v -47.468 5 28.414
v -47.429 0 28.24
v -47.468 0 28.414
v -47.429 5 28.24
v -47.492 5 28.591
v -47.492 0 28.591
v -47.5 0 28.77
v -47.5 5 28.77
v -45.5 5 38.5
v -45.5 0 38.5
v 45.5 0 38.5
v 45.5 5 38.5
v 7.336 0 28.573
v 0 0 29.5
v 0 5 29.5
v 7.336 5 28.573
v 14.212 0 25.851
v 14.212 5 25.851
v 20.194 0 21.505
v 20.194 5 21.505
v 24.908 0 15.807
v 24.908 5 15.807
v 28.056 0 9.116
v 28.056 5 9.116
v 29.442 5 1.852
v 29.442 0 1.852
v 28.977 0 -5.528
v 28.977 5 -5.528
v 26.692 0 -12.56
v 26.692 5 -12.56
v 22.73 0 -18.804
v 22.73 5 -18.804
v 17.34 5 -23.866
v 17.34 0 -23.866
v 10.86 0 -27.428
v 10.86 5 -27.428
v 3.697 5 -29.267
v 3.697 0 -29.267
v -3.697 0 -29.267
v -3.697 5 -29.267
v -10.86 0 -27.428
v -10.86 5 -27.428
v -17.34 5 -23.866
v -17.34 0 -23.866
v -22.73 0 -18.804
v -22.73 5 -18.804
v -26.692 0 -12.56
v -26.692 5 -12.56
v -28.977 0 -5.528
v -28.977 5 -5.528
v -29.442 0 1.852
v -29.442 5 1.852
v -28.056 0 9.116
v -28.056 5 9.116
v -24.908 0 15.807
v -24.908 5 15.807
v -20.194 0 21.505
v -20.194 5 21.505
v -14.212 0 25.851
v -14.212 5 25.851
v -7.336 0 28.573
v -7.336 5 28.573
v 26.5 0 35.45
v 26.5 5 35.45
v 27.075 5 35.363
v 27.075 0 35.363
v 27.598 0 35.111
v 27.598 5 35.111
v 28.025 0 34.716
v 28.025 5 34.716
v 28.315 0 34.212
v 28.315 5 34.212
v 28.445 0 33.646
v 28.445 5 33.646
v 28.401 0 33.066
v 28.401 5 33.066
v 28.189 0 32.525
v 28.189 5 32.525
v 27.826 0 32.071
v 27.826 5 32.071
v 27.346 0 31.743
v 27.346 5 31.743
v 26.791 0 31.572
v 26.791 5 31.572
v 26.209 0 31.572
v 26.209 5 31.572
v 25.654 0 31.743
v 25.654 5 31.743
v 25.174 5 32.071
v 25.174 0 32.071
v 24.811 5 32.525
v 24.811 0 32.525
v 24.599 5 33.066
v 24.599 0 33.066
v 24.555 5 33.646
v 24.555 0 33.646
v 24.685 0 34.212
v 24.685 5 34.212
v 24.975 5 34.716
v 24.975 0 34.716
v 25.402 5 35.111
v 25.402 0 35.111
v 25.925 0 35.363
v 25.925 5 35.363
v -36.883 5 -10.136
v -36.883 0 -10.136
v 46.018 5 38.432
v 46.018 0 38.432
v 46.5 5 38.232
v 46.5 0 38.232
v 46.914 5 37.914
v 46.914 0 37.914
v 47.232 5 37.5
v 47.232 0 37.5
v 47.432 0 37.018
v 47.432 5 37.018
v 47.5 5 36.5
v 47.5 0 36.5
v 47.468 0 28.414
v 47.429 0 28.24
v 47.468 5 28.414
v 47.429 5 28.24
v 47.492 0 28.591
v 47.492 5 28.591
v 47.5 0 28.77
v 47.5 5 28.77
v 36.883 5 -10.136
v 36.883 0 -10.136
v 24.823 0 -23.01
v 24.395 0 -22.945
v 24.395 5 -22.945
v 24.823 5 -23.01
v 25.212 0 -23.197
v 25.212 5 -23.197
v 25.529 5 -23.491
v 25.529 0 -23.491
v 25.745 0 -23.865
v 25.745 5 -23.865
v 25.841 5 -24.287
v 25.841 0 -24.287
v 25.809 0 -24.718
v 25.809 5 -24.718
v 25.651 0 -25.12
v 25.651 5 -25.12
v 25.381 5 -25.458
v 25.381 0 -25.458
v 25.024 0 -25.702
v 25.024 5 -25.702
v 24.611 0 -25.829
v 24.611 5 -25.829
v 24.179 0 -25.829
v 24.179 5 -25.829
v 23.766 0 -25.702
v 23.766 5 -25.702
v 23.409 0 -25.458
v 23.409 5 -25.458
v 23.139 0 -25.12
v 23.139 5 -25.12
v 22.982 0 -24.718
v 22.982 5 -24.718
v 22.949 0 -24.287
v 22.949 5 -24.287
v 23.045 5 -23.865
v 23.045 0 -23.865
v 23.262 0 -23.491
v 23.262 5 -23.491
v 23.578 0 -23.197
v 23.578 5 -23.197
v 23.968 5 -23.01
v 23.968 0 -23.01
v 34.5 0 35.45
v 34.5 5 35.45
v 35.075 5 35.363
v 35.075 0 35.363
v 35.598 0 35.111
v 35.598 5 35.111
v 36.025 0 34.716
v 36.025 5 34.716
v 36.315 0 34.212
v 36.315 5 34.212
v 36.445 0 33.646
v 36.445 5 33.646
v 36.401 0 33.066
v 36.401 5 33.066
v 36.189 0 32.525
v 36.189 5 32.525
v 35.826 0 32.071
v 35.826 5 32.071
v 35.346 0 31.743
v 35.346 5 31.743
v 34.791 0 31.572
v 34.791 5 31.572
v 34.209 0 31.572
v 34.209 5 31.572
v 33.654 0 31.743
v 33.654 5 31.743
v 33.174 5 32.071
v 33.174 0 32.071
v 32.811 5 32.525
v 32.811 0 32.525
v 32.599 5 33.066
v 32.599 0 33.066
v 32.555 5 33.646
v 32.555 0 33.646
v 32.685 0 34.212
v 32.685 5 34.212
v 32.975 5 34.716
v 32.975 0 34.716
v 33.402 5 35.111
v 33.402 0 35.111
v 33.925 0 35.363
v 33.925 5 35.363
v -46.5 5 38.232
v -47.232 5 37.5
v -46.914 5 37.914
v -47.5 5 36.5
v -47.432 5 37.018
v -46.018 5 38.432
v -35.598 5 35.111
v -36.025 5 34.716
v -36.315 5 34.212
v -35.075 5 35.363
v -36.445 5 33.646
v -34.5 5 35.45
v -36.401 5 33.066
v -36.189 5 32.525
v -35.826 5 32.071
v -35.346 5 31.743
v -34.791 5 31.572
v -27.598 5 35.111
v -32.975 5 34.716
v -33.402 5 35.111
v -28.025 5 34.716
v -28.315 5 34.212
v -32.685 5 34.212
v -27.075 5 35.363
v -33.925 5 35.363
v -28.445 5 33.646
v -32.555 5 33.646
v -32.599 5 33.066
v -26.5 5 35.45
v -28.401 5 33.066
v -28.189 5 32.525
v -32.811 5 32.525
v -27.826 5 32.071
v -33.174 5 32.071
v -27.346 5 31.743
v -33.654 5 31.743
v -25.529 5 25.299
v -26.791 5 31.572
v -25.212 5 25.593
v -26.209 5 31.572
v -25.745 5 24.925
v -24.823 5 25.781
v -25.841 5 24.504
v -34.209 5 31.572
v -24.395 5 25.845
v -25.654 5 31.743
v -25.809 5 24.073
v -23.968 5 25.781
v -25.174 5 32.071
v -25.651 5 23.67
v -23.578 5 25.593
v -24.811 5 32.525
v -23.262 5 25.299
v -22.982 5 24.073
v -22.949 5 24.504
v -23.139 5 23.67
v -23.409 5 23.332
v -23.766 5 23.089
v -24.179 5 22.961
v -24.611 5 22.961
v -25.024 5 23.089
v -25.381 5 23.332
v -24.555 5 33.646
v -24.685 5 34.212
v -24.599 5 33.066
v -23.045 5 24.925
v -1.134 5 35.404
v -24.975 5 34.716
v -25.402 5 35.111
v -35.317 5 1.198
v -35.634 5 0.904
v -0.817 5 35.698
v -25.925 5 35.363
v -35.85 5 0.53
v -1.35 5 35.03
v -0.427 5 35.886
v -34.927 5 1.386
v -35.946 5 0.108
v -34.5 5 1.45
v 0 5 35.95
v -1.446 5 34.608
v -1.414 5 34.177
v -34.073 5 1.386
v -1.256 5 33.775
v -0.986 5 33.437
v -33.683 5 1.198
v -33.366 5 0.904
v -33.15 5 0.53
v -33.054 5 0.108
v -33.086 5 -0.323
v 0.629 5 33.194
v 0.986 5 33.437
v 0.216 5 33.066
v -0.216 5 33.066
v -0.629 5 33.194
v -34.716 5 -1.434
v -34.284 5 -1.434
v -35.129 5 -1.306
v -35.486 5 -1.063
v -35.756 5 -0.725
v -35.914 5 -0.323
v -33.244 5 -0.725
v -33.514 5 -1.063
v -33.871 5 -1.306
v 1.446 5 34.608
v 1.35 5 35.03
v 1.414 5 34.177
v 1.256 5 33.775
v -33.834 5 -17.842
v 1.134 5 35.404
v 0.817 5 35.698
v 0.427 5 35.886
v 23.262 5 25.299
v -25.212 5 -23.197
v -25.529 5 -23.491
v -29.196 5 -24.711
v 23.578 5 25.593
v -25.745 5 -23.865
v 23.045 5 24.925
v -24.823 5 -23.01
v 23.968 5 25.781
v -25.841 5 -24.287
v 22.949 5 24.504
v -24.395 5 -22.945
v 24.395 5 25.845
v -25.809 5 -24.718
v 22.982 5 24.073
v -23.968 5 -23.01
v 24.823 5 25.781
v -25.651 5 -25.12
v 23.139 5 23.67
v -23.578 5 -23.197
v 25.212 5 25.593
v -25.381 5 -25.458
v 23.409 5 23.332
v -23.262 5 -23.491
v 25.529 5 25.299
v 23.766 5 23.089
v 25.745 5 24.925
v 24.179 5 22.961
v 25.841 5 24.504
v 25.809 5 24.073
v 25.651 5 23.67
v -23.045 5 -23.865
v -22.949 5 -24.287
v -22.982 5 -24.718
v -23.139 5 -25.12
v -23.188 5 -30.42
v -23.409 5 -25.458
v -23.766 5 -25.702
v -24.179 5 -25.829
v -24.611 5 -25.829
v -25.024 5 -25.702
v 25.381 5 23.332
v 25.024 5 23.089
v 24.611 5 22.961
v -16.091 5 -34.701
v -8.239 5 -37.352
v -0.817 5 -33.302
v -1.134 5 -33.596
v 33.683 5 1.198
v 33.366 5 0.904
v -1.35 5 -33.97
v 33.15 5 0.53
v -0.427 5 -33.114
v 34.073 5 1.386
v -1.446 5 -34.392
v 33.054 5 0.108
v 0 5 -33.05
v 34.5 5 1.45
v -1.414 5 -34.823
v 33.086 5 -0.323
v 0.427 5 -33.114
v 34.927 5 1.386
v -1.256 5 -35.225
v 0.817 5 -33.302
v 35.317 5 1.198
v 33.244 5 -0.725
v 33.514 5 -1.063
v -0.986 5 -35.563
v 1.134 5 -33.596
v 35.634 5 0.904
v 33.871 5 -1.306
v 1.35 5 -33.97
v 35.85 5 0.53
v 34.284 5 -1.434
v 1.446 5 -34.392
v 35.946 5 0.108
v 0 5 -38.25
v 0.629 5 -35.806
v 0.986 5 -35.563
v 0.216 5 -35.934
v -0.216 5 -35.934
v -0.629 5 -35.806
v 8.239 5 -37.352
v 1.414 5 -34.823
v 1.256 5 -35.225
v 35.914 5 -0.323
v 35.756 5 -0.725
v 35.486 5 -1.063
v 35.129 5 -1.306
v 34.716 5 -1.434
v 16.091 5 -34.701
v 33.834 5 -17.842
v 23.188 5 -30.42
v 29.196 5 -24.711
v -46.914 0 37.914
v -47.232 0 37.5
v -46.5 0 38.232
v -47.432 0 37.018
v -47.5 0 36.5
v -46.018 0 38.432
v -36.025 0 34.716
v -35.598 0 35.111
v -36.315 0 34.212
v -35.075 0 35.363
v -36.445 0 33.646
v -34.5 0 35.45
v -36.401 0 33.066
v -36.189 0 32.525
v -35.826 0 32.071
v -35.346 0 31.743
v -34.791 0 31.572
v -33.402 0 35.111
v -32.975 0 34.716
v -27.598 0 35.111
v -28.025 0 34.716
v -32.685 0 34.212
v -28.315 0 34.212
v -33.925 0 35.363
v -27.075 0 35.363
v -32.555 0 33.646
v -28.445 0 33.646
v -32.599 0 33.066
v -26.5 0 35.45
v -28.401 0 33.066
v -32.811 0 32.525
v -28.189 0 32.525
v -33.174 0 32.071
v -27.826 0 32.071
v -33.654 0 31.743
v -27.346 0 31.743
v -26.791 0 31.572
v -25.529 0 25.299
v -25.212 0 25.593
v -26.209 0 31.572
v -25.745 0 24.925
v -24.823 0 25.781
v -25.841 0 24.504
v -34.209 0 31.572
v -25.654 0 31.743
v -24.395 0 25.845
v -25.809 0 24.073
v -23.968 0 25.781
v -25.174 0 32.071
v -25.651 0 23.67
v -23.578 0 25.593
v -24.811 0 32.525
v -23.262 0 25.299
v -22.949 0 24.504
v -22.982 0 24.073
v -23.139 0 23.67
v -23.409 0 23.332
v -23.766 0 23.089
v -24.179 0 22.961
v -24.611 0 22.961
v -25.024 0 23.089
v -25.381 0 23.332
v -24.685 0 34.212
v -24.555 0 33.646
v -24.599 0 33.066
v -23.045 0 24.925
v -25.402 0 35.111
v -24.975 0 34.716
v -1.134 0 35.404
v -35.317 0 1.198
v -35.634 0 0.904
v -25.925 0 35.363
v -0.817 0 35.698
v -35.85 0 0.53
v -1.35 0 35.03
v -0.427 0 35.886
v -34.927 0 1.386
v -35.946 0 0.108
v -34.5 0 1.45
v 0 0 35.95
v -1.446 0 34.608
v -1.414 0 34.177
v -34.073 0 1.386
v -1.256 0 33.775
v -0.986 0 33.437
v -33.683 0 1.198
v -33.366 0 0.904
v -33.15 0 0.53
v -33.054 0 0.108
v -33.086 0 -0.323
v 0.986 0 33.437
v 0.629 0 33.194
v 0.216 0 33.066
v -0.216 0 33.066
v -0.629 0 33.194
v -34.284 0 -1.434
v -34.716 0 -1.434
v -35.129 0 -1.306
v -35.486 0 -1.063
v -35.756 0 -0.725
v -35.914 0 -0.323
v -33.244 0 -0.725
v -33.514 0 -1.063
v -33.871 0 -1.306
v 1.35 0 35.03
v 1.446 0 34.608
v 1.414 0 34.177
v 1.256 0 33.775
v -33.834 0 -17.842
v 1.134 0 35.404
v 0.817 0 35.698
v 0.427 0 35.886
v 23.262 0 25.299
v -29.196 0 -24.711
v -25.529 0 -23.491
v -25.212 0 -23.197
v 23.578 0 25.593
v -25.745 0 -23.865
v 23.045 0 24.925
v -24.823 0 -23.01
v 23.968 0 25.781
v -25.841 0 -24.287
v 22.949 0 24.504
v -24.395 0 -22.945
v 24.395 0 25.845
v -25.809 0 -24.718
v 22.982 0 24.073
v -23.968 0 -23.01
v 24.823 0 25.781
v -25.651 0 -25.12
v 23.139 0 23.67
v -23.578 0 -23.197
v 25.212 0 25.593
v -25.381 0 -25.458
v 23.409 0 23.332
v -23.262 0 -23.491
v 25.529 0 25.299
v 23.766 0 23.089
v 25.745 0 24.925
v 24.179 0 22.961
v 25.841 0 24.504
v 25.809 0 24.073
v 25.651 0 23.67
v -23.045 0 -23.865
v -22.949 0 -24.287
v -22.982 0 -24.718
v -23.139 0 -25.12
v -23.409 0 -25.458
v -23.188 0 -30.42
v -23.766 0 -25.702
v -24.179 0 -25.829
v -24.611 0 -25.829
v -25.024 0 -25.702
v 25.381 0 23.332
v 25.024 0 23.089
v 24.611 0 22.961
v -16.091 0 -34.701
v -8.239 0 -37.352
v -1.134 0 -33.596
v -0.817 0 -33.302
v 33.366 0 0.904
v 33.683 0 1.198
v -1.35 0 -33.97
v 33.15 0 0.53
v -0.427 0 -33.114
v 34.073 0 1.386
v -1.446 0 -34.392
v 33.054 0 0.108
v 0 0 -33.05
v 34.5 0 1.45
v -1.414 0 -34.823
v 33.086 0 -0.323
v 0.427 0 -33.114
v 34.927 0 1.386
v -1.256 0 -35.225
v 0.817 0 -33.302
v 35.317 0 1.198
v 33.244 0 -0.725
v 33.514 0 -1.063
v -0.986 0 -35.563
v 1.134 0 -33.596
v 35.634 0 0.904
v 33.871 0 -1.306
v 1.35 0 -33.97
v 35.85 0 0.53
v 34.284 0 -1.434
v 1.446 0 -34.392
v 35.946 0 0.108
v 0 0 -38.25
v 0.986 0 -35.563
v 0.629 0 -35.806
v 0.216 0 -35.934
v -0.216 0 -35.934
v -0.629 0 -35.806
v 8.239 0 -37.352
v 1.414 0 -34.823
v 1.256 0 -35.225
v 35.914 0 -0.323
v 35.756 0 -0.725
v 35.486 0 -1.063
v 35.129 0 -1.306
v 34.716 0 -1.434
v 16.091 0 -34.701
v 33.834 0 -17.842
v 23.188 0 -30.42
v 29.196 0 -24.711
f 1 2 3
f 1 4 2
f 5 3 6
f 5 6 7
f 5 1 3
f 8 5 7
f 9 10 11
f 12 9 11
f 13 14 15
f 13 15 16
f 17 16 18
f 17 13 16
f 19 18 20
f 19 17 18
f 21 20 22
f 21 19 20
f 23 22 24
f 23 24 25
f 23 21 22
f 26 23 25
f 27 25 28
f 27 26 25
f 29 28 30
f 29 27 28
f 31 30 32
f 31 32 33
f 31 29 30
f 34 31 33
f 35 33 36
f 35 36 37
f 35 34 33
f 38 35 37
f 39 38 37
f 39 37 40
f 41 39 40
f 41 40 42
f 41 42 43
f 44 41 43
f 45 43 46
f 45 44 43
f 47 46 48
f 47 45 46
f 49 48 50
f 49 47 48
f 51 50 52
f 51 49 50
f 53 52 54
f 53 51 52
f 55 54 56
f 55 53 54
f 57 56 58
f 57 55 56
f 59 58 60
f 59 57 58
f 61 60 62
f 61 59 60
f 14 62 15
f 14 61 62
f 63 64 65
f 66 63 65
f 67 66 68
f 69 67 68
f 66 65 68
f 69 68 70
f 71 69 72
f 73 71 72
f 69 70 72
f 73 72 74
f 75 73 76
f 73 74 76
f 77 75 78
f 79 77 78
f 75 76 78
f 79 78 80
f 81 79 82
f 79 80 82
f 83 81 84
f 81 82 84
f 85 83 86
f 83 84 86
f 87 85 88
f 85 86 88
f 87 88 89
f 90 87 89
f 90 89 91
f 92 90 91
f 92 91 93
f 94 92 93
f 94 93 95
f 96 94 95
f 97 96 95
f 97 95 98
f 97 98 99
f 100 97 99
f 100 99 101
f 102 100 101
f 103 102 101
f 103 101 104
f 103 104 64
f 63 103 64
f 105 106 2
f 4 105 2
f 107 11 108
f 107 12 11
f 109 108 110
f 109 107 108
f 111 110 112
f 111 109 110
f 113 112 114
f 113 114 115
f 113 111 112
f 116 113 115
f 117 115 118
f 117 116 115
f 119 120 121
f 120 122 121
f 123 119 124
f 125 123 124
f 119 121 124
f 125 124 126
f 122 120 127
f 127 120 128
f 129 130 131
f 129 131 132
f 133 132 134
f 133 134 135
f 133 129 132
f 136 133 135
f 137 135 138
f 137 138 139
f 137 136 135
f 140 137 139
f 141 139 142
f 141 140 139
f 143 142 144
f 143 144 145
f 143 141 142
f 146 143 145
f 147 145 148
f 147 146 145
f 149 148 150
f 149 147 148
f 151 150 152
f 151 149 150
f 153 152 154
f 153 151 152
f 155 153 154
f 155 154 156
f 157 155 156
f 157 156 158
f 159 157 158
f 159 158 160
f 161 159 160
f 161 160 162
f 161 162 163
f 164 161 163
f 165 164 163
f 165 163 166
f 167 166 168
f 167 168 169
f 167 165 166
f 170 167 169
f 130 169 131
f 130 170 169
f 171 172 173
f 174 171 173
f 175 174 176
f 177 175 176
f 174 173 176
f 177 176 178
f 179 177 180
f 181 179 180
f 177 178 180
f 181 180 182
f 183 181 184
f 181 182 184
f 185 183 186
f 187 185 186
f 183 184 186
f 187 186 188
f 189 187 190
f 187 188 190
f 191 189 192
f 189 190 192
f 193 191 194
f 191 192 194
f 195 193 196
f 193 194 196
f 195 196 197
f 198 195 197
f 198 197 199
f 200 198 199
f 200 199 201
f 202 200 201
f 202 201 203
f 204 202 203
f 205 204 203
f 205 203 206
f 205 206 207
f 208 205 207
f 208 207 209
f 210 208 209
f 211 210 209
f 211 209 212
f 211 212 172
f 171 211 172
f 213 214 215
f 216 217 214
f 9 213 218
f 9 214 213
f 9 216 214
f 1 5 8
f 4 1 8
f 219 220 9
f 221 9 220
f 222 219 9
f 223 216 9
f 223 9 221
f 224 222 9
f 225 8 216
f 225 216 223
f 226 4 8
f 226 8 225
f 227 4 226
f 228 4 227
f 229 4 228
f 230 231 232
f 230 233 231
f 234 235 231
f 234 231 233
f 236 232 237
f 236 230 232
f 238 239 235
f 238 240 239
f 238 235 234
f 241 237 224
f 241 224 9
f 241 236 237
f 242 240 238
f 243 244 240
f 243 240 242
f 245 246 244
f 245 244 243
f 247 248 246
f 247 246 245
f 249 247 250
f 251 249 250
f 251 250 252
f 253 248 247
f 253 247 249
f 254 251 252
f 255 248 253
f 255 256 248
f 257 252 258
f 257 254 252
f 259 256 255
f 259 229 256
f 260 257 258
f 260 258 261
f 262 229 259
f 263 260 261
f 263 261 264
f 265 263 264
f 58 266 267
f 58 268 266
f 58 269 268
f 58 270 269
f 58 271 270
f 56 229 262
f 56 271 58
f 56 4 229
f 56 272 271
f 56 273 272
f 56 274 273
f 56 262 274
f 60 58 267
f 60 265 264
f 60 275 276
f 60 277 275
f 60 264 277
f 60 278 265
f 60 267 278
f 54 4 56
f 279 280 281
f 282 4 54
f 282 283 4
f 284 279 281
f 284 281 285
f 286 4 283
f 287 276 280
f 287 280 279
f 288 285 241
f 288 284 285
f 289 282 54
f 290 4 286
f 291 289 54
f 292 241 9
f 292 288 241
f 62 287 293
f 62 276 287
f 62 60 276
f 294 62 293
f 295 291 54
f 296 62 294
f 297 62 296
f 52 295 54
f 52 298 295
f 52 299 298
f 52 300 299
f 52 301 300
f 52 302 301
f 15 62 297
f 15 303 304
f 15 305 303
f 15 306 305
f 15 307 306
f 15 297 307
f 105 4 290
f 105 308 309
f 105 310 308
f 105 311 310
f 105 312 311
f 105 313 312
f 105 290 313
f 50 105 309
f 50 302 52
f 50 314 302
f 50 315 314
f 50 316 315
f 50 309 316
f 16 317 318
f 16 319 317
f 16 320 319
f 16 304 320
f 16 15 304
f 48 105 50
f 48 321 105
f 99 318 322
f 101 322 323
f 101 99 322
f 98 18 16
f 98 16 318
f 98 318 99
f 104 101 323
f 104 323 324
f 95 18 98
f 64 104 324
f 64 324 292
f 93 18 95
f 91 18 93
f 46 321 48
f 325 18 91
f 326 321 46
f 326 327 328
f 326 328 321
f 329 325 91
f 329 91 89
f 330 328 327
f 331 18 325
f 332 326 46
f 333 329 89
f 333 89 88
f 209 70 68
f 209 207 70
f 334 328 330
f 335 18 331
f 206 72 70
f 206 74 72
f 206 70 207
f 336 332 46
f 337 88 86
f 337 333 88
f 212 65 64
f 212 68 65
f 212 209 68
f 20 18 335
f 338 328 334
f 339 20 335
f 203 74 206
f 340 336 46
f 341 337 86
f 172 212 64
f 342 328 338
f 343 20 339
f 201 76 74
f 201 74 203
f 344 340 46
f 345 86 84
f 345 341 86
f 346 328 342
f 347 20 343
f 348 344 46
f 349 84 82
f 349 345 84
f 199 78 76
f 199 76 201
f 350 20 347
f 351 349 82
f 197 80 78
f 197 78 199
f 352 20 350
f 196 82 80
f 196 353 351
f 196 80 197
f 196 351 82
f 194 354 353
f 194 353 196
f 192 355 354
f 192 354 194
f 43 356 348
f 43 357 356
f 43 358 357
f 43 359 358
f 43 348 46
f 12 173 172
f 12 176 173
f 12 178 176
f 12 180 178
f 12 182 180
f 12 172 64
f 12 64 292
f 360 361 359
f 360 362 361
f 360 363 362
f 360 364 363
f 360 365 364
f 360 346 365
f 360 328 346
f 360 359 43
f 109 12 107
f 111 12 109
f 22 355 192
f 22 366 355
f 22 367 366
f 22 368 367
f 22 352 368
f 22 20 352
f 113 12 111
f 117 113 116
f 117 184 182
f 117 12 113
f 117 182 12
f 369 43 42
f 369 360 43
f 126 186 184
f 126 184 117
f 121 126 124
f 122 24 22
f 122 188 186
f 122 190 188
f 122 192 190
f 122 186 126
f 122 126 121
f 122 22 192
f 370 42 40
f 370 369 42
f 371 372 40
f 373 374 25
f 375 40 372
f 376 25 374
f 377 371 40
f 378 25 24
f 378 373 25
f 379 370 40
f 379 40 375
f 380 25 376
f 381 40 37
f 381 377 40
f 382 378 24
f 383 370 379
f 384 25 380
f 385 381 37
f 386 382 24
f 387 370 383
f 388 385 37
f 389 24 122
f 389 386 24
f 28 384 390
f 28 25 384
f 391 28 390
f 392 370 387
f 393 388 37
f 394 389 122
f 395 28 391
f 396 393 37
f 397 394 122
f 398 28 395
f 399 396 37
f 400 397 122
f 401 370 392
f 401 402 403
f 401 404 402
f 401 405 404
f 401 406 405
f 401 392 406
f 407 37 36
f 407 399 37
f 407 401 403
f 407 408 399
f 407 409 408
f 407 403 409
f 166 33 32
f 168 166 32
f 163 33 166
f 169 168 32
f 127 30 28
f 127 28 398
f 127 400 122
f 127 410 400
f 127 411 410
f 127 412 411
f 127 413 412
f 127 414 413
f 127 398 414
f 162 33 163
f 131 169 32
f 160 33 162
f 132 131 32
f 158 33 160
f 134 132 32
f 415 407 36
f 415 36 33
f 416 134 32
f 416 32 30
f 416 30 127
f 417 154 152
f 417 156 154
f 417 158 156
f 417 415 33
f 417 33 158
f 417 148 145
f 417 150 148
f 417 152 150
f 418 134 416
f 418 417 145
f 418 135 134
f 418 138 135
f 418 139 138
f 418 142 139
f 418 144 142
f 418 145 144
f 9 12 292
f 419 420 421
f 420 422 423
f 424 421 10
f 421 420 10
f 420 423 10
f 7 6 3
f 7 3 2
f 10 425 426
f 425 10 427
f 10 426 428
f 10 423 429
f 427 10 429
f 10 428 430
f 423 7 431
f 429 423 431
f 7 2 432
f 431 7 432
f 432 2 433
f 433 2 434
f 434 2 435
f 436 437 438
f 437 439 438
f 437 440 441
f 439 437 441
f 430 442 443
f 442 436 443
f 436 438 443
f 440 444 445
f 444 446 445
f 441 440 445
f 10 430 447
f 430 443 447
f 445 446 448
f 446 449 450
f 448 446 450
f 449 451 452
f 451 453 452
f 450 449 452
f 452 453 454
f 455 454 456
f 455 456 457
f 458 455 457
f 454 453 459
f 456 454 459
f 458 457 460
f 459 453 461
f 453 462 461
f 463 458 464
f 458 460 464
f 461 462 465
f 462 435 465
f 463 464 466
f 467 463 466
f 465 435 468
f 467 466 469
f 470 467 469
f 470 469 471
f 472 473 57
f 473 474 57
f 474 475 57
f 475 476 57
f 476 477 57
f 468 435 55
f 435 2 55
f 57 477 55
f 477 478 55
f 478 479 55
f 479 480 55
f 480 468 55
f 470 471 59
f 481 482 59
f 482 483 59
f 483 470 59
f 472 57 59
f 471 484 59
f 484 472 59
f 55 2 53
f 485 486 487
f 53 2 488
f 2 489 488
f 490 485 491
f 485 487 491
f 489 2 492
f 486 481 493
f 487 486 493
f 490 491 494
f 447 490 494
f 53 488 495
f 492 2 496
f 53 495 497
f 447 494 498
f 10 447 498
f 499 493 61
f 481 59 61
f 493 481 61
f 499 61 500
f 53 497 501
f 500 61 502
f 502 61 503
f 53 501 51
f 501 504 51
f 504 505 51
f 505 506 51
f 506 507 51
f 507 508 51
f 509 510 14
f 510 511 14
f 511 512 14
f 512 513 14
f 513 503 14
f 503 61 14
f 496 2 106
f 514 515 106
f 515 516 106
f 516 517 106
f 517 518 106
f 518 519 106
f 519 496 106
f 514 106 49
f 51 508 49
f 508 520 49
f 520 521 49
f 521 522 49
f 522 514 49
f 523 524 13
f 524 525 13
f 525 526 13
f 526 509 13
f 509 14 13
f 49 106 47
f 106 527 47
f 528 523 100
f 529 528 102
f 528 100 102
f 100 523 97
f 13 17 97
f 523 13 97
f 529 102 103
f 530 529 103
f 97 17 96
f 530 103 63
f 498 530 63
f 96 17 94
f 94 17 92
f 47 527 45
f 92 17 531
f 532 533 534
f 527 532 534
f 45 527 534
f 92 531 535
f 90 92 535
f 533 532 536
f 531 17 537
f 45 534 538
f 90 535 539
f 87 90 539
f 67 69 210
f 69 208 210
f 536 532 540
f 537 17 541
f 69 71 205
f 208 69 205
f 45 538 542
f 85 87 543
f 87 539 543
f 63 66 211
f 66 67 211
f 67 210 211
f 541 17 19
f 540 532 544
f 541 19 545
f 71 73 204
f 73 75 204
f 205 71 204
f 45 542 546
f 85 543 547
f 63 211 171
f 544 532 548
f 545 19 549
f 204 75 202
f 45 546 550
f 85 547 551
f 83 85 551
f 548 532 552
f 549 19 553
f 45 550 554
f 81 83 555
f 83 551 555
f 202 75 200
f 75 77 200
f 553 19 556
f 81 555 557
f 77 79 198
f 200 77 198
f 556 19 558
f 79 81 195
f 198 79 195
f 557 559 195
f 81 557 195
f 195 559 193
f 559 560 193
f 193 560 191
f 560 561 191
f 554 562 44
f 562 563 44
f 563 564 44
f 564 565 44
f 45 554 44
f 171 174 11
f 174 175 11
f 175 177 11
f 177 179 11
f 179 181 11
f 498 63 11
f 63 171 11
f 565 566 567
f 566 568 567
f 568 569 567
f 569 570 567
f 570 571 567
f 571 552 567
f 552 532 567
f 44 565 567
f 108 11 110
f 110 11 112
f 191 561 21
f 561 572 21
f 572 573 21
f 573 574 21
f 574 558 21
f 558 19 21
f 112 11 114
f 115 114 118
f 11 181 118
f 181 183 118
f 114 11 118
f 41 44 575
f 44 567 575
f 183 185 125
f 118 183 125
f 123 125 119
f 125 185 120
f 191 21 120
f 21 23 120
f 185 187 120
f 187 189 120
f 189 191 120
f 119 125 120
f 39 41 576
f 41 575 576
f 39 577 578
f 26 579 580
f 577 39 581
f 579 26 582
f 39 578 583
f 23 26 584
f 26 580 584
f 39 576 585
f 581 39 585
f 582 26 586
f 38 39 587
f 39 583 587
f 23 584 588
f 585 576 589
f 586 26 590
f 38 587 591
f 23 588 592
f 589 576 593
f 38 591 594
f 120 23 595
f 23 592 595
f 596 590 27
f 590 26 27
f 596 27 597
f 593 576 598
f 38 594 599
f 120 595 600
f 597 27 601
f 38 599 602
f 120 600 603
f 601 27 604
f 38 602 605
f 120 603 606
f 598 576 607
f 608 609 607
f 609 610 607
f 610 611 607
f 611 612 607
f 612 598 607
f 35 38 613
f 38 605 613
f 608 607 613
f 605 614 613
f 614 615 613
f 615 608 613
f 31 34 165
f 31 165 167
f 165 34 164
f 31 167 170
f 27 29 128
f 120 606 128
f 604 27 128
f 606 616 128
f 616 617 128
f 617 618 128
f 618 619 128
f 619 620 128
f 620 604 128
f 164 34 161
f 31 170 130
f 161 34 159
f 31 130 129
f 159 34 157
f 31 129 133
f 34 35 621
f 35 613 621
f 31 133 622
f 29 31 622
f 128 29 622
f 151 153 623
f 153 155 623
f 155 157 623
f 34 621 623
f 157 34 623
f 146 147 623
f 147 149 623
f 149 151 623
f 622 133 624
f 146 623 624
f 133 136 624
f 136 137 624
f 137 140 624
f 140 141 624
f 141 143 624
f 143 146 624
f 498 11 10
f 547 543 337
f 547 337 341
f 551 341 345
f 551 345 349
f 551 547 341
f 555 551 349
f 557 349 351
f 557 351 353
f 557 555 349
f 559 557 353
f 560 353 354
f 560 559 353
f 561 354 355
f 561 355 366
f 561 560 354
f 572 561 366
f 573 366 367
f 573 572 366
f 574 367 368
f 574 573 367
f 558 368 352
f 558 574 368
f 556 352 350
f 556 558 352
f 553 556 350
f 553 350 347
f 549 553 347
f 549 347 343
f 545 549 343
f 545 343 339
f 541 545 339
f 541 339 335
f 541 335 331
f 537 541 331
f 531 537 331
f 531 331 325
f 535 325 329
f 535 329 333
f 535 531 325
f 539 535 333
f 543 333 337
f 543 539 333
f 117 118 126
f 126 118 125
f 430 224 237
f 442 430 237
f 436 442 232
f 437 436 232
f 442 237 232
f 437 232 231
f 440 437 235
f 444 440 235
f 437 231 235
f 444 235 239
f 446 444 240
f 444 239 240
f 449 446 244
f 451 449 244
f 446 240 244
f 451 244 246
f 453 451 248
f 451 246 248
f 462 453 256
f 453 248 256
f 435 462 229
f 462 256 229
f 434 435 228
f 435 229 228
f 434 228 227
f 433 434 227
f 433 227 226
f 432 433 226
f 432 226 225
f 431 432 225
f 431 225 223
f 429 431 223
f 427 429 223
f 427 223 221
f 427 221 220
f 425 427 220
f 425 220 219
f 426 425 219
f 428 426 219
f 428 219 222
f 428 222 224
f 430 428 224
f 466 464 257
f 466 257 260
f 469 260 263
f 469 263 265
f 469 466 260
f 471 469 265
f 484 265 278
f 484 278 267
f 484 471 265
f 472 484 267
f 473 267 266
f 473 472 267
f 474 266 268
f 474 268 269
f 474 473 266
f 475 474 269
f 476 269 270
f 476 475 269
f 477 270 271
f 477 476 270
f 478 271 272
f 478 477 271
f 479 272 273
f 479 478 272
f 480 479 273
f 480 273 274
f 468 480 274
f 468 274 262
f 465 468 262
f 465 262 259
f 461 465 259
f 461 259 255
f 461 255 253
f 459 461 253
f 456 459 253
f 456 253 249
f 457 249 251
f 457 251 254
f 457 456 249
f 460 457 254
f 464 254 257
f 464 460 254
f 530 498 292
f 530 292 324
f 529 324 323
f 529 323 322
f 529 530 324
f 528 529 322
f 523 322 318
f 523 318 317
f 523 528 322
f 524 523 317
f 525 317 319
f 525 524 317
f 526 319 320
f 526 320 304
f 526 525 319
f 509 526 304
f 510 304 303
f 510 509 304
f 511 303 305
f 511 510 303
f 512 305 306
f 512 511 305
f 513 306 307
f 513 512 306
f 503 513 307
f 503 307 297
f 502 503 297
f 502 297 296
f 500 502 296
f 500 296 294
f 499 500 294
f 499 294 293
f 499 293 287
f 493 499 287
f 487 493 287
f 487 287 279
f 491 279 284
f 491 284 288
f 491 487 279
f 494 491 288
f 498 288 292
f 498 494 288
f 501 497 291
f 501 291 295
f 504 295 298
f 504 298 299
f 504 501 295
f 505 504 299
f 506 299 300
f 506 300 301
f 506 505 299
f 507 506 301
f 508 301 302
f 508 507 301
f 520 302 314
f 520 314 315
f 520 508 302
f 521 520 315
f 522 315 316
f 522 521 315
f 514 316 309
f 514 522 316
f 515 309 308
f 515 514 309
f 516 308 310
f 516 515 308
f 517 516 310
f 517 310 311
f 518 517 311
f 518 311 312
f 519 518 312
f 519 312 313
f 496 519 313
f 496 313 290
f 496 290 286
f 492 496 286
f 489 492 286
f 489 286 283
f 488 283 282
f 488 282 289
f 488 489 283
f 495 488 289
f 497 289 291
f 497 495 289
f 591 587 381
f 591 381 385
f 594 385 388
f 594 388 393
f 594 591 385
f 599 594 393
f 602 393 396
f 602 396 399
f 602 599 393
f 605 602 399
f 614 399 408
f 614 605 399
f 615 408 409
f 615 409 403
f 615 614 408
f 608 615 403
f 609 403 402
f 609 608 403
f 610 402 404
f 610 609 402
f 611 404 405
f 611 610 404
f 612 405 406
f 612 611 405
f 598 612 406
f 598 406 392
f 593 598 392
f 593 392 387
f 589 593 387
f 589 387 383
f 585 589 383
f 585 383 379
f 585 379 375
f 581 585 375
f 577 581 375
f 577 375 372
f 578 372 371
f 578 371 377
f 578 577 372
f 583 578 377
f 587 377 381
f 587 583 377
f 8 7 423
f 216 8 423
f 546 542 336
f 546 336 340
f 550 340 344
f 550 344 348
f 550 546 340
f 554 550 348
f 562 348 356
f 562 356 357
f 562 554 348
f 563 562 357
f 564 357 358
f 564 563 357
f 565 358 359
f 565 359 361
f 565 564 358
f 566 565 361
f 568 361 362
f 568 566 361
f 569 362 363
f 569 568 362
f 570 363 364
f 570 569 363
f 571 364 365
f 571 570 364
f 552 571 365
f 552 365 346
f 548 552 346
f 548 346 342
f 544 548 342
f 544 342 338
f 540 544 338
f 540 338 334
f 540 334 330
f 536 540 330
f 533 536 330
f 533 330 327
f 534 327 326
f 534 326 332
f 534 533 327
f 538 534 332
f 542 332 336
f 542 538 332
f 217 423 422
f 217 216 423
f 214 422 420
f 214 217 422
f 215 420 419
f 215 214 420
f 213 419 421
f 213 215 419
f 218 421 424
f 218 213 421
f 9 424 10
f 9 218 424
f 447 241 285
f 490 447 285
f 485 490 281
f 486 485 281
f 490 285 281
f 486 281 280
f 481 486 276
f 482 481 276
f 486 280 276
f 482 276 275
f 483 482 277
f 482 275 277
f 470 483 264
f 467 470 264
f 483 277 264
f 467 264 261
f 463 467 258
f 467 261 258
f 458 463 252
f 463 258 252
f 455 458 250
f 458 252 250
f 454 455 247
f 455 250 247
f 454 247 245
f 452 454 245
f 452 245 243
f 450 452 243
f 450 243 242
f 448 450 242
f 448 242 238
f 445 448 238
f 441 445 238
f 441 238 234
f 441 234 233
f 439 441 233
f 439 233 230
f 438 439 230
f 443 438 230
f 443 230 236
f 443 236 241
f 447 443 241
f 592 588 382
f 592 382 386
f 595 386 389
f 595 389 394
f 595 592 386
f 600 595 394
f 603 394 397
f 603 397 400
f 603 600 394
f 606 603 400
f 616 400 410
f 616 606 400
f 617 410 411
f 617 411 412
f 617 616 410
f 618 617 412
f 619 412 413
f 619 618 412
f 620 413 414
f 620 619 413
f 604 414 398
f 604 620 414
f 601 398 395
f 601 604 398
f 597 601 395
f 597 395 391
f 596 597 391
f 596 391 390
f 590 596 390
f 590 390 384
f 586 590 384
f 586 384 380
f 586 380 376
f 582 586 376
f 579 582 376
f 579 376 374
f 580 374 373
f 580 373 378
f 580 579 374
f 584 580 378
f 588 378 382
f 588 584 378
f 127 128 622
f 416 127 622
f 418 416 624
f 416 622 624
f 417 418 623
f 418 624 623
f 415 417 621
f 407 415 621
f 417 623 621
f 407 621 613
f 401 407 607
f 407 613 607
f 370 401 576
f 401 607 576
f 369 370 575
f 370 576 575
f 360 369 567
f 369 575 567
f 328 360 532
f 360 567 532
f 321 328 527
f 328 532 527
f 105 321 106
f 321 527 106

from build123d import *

# Parameters (mm, degrees)
SKETCH_1_R          = 29.5
SKETCH_1_R_2        = 1.45
EXTRUDE_1_DEPTH     = 5
SKETCH_2_R          = 1.95
CUT_EXTRUDE_1_DEPTH = 62.347371582
FILLET_1_R          = 2


with BuildPart() as part:
    # 草图1 → 凸台-拉伸1 (new body)
    with BuildSketch(Plane(origin=(0, 0, 0), x_dir=(1, 0, 0), z_dir=(0, 1, 0))):
        with BuildLine():
            Line((-36.882678944, 10.135605257), (-47.5, -28.5))
            Line((-47.5, -28.5), (-47.5, -38.5))
            Line((-47.5, -38.5), (47.5, -38.5))
            Line((47.5, -38.5), (47.5, -28.5))
            Line((47.5, -28.5), (36.882678944, 10.135605257))
            ThreePointArc((36.882678944, 10.135605257), (0, 38.25), (-36.882678944, 10.135605257))
        make_face()
        with Locations(Location((0, 0, 0), (0, 0, 270))):
            Circle(SKETCH_1_R, mode=Mode.SUBTRACT)
        with Locations(Location((-34.5, 0, 0), (0, 0, 270))):
            Circle(SKETCH_1_R_2, mode=Mode.SUBTRACT)
        with Locations(Location((-24.395183951, 24.395183951, 0), (0, 0, 270))):
            Circle(SKETCH_1_R_2, mode=Mode.SUBTRACT)
        with Locations(Location((0, 34.5, 0), (0, 0, 270))):
            Circle(SKETCH_1_R_2, mode=Mode.SUBTRACT)
        with Locations(Location((24.395183951, 24.395183951, 0), (0, 0, 270))):
            Circle(SKETCH_1_R_2, mode=Mode.SUBTRACT)
        with Locations(Location((34.5, 0, 0), (0, 0, 270))):
            Circle(SKETCH_1_R_2, mode=Mode.SUBTRACT)
        with Locations(Location((24.395183951, -24.395183951, 0), (0, 0, 270))):
            Circle(SKETCH_1_R_2, mode=Mode.SUBTRACT)
        with Locations(Location((0, -34.5, 0), (0, 0, 270))):
            Circle(SKETCH_1_R_2, mode=Mode.SUBTRACT)
        with Locations(Location((-24.395183951, -24.395183951, 0), (0, 0, 270))):
            Circle(SKETCH_1_R_2, mode=Mode.SUBTRACT)
    extrude(amount=EXTRUDE_1_DEPTH)

    # 草图2 → 切除-拉伸1 (cut, through all)
    with BuildSketch(Plane(origin=(0, 5, 0), x_dir=(1, 0, 0), z_dir=(0, 1, 0))):
        with Locations(Location((-34.5, -33.5, 0), (0, 0, 270))):
            Circle(SKETCH_2_R)
        with Locations(Location((-26.5, -33.5, 0), (0, 0, 270))):
            Circle(SKETCH_2_R)
        with Locations(Location((26.5, -33.5, 0), (0, 0, 270))):
            Circle(SKETCH_2_R)
        with Locations(Location((34.5, -33.5, 0), (0, 0, 270))):
            Circle(SKETCH_2_R)
    extrude(amount=-CUT_EXTRUDE_1_DEPTH, mode=Mode.SUBTRACT)

    # 圆角1
    fillet_1_edges = [part.edges().sort_by_distance(p)[0] for p in [
        (47.5, 2.5, 28.5),
        (47.5, 2.5, 38.5),
        (-47.5, 2.5, 38.5),
        (-47.5, 2.5, 28.5),
    ]]
    fillet(fillet_1_edges, radius=FILLET_1_R)


solid = part.part
